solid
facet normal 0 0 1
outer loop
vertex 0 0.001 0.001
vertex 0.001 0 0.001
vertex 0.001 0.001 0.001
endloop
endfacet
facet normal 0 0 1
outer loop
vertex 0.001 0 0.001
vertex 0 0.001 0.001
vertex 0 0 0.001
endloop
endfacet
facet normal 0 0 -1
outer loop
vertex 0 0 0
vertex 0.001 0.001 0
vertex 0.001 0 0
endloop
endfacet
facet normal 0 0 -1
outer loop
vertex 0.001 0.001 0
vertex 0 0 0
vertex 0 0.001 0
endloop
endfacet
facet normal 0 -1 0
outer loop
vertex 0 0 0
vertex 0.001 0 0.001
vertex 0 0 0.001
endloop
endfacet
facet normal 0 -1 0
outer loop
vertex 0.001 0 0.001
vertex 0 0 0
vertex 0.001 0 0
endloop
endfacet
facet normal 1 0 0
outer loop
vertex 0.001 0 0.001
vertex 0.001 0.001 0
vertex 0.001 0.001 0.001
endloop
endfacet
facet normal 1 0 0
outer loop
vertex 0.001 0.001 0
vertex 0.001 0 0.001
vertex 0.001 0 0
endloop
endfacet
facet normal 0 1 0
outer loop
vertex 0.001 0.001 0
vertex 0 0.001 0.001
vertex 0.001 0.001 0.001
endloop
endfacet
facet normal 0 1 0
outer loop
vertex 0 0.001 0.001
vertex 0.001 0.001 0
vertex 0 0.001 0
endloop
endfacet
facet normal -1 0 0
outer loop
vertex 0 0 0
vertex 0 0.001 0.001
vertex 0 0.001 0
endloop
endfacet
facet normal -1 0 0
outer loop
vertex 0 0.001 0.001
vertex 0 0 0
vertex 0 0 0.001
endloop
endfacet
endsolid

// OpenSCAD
// t_frame — roll policy. The requirement half_curvedPipe.scad discovered
// (docs/developer/history.md §2), now expressed as two policy strings.

use <../src/uniTube.scad>;

// A path with two bends in DIFFERENT planes -- the case where a naively derived
// frame spirals and a split seam would wander around the tube.
sp = ut_polyline([[0, 0, 0], [40, 0, 0], [40, 40, 0], [40, 40, 40]], r=12);

// --- transport (default): rotation-minimizing -------------------------------
tr = ut_stations(sp, [["frame", "transport"]]);
assert(max([for (s = tr) abs(ut_st_t(s) * ut_st_n(s))]) < 1e-9, "transport: n stays orthogonal to t");
assert(max([for (s = tr) abs(norm(ut_st_n(s)) - 1)]) < 1e-9, "transport: n stays unit");
// STATION-6: the frame never flips -- consecutive normals differ by < 90 deg.
assert(
    max([for (i = [0:len(tr) - 2]) ut_turn(ut_st_n(tr[i]), ut_st_n(tr[i + 1]))]) < 90,
    "STATION-6: continuous roll, no frame flip"
);

// --- fixed: the seam is pinned to a WORLD direction --------------------------
// Stronger than transport for a printable split conduit: transport only stops
// the seam spiralling relative to the TUBE, but a printed part has a
// gravity-relative requirement.
//
// THIS PATH IS NOT `sp`. `sp` finishes by running straight up, and a seam pinned
// to UP has no defined direction where the axis points along UP -- see below.
spf = ut_polyline([[0, 0, 0], [40, 0, 0], [40, 40, 0], [70, 40, 25]], r=12);
fx = ut_stations(spf, [["frame", "fixed"], ["normal", [0, 0, 1]]]);
assert(max([for (s = fx) abs(ut_st_t(s) * ut_st_n(s))]) < 1e-9, "fixed: n stays orthogonal to t");
// Every normal is UP projected into the station's plane, so on any station whose
// tangent is horizontal the normal is exactly UP.
horiz = [for (s = fx) if (abs(ut_st_t(s)[2]) < 1e-9) s];
assert(len(horiz) > 0, "expected some horizontal stations");
assert(max([for (s = horiz) norm(ut_st_n(s) - [0, 0, 1])]) < 1e-9, "fixed: horizontal stations point exactly UP");

// --- the vertical-tangent degeneracy -----------------------------------------
// THIS SECTION USED TO ASSERT THE WRONG PROPERTY, and that is how a 174-degree
// seam flip shipped in examples/05 for the whole life of the library.
//
// It ran `sp` -- whose final leg goes straight up -- through frame="fixed", and
// checked that the result was FINITE. It is finite: ut_ref_fallback() swaps UP
// for BACK when the tangent is parallel to UP, so nothing is NaN. But finite is
// not the requirement. The fallback is a hard switch, so applying it PER STATION
// makes it a DISCONTINUITY: the seam jumped 174 degrees in a single 6-degree
// step, the mesh stayed manifold, CGAL said Simple: yes, and every gate passed.
//
// The right answer is that the ask is undefined, not that it is finite. A
// vertical pipe has no upward-facing side. ut_stations() refuses it now, and
// tests/guards/g_fixed_vertical.scad is that refusal, watched to fire.
//
// ut_ref_fallback IS still correct for what it was written for: seeding a
// transport frame ONCE on a run that starts vertical. Used once there is no
// discontinuity to create, and that is what is asserted here.
vert = ut_stations(ut_polyline([[0, 0, 0], [0, 0, 60]]));
vn = ut_st_n(vert[0]);
assert(
    is_num(vn[0]) && is_num(vn[1]) && is_num(vn[2]),
    "transport: a run that STARTS vertical must not seed a NaN frame -- this killed the previous attempt's own example"
);
assert(abs(norm(vn) - 1) < 1e-9, "transport: the seeded normal is still a unit vector");
assert(abs(vn * ut_st_t(vert[0])) < 1e-9, "transport: and still orthogonal to a vertical tangent");

// --- an explicit per-station normal list --------------------------------------
// Again NOT `sp`: an all-UP list on a run that finishes vertical leaves nothing
// after projection, and ut_ortho() returned [nan, nan, nan] SILENTLY. The assert
// below is the one that was supposed to catch it and did not -- OpenSCAD's max()
// drops nan, so it measured 2.22e-16 on a frame list ending in nan and passed.
// Orthogonality is now checked per station with an explicit is_num, and
// ut_stations() refuses the degenerate list outright
// (tests/guards/g_frame_list_parallel.scad).
nf = len(ut_stations(spf));
manual = ut_stations(spf, [["frame", [for (i = [0:nf - 1]) [0, 0, 1]]]]);
assert(len(manual) == nf, "manual policy preserves station count");
assert(
    len([for (s = manual) if (!is_num(ut_st_n(s)[0]) || !is_num(ut_st_n(s)[1]) || !is_num(ut_st_n(s)[2])) 1]) == 0,
    "manual: no station frame may contain nan -- max() cannot see this, so count it instead"
);
assert(max([for (s = manual) abs(ut_st_t(s) * ut_st_n(s))]) < 1e-9, "manual: projected orthogonal to t");

// ============================================ STATION-6, now enforced
// "Continuous roll -- the frame never flips" was documented from Phase 1 and
// never checked. The measure is the roll step IN EXCESS of the tangent step:
// parallel transport turns the normal exactly as much as the tangent, so the
// excess is 0 by construction, and a fixed frame measures 0 to 1e-13.
function _excess(sts) =
    max(
        [
            for (i = [1:len(sts) - 1]) ut_turn(ut_st_n(sts[i]), ut_st_n(sts[i - 1])) - ut_turn(ut_st_t(sts[i]), ut_st_t(sts[i - 1])),
        ]
    );

s6 = ut_polyline([[0, 0, 0], [60, 0, 0], [60, 40, 0], [100, 40, 30]], r=18);
assert(_excess(ut_stations(s6)) < 1e-9, "STATION-6: transport never outruns the tangent");
assert(
    _excess(ut_stations(s6, [["frame", "fixed"], ["normal", [0, 0, 1]]])) < 1e-9,
    str(
        "STATION-6: a fixed frame away from its own axis is smooth, got ",
        _excess(ut_stations(s6, [["frame", "fixed"], ["normal", [0, 0, 1]]]))
    )
);
// twist is DECLARED intent distributed by arclength, not a flip, and the check
// runs on the pre-twist normals so it cannot be tripped by asking for one.
assert(len(ut_stations(s6, [["twist", 720]])) > 2, "a large declared twist is not a flip");

// A fixed frame stays smooth right up to 1 degree from its own reference axis --
// the failure is a cliff AT the axis, not gradual ill-conditioning, which is why
// _ut_fixed_ok refuses only the genuinely undefined ask.
near = ut_polyline([[0, 0, 0], [60, 0, 0], [61.05, 0, 60]], r=15);
assert(
    min(
        [
            for (st = ut_stations(near, [["frame", "fixed"], ["normal", [0, 0, 1]]]))
            let (a = ut_turn(ut_st_t(st), [0, 0, 1])) min(a, 180 - a),
        ]
    ) < 2,
    "this path really does come within 2 degrees of vertical"
);
assert(
    _excess(ut_stations(near, [["frame", "fixed"], ["normal", [0, 0, 1]]])) < 1e-9,
    "and the fixed frame is still smooth there"
);

cube(0.001); // sentinel
